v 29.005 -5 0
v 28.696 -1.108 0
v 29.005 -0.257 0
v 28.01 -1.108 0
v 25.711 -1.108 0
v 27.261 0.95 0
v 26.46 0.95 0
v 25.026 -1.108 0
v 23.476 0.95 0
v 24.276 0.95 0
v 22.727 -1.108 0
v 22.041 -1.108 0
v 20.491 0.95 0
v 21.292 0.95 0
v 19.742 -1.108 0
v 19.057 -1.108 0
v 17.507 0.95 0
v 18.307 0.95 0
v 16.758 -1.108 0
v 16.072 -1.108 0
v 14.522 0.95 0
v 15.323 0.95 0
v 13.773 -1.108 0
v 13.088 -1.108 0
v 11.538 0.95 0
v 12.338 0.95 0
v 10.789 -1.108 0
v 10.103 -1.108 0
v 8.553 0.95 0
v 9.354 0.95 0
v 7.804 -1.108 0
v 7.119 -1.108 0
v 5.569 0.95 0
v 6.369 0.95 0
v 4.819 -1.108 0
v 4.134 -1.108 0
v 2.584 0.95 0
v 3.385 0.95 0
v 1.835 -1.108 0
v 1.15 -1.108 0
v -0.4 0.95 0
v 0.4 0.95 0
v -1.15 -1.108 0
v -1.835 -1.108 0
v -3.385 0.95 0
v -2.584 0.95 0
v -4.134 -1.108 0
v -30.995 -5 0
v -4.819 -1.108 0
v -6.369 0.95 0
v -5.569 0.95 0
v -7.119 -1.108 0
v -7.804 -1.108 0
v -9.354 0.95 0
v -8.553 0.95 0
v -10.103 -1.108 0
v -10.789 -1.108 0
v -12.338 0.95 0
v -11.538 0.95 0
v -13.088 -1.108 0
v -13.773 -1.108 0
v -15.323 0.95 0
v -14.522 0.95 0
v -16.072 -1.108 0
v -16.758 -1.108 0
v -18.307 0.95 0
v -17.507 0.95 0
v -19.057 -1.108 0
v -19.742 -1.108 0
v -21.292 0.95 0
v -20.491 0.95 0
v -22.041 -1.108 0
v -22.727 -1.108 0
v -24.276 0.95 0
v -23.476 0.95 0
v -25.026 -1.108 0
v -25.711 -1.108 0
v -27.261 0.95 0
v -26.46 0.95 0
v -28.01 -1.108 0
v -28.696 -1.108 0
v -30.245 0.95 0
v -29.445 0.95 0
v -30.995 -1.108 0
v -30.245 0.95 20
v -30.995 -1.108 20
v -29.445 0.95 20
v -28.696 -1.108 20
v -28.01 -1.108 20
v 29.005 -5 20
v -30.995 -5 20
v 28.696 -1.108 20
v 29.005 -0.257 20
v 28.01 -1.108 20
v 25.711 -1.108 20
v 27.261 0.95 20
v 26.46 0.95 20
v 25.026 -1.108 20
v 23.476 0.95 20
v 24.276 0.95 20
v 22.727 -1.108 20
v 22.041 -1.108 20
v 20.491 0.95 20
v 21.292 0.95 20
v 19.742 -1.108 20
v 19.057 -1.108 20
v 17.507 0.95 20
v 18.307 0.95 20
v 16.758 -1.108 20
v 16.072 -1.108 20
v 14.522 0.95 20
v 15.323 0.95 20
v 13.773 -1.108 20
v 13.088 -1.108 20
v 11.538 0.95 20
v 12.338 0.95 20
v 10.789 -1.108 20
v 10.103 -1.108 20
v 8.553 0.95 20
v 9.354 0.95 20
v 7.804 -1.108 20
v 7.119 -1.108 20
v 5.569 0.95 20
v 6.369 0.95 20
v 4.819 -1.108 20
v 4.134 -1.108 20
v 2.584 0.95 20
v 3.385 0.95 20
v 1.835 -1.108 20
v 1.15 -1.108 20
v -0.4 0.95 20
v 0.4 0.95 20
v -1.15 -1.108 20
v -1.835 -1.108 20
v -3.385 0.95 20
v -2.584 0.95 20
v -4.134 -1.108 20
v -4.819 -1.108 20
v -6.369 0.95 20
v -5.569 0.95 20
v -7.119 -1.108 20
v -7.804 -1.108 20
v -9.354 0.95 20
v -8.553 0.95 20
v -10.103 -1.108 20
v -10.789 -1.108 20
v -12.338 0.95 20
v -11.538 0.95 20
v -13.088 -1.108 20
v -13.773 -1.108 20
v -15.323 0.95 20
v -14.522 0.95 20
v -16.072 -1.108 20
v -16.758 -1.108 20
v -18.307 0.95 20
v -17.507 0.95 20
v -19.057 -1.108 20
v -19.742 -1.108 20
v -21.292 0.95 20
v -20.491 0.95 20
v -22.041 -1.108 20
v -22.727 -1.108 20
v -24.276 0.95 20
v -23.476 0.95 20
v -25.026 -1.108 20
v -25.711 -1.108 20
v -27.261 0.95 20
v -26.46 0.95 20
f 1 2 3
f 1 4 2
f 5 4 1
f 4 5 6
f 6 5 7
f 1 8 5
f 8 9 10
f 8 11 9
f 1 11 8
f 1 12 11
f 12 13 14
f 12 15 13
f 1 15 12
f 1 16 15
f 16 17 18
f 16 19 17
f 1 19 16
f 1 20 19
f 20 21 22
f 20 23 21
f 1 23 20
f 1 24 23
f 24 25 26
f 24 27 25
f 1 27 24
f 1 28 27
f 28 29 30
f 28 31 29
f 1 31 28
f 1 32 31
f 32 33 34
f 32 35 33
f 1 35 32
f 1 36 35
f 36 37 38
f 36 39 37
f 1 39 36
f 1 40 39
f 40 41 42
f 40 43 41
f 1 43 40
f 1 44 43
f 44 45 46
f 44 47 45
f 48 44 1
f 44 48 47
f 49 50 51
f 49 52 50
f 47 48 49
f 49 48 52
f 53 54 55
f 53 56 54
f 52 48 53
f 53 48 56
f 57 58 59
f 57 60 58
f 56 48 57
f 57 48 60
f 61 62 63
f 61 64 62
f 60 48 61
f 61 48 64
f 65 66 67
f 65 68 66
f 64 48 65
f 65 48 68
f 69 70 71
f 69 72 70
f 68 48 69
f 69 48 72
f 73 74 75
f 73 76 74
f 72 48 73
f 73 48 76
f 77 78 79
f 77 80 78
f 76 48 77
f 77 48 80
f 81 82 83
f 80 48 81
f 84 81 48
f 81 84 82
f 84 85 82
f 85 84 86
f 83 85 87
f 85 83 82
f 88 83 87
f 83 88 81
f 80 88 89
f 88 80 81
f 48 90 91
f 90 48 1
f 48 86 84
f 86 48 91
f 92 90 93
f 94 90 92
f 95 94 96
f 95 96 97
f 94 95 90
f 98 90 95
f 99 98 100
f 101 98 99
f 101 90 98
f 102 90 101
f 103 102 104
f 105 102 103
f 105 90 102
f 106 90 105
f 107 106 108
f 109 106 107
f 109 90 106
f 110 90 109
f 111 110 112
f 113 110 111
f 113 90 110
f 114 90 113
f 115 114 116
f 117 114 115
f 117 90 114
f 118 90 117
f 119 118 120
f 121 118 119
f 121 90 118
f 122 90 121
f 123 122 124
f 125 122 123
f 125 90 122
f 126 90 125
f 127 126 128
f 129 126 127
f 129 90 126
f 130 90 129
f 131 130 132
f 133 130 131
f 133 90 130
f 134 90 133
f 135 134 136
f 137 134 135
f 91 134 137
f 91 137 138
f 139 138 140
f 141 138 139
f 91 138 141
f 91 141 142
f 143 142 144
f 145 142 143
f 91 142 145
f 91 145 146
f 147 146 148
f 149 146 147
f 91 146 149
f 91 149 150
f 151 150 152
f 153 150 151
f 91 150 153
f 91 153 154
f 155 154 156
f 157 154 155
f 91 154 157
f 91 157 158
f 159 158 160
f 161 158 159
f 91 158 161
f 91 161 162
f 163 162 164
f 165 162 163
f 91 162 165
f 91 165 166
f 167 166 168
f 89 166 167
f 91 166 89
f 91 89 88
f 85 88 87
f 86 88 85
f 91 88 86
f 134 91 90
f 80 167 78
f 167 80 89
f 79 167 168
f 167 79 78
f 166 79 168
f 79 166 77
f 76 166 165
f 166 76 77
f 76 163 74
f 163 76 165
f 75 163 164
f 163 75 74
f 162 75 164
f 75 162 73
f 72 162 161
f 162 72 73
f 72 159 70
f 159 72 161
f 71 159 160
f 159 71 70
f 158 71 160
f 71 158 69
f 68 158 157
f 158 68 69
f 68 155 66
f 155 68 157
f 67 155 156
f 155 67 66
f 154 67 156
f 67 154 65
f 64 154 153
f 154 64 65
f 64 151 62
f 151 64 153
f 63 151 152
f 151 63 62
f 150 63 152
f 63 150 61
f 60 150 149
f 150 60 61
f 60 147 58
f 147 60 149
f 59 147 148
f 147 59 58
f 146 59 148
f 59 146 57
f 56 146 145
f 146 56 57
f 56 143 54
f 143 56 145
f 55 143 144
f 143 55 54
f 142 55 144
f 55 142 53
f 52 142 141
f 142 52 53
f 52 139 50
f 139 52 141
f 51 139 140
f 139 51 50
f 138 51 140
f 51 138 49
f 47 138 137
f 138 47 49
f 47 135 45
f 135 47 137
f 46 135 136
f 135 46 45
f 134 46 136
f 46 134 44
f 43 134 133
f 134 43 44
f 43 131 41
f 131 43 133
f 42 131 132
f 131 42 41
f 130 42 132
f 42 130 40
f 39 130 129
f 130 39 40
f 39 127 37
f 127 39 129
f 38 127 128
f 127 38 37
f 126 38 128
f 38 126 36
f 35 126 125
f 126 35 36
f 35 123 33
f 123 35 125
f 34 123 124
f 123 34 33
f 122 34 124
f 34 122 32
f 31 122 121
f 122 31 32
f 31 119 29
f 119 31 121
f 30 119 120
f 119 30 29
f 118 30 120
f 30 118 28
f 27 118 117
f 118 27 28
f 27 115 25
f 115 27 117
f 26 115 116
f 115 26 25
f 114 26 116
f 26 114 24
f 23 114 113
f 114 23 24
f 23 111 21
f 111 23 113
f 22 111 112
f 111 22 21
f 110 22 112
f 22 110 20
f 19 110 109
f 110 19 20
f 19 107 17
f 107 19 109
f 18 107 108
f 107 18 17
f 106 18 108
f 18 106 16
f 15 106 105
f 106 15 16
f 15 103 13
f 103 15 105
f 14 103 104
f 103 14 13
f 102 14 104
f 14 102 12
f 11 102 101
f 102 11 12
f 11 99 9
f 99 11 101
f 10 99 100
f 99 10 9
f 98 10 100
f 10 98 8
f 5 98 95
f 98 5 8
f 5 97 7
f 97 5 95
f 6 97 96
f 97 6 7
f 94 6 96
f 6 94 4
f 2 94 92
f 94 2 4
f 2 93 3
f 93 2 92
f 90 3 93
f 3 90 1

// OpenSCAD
include <../gears.scad>

rack(modul=1, length=60, height=5, width=20, pressure_angle=20, helix_angle=0);
